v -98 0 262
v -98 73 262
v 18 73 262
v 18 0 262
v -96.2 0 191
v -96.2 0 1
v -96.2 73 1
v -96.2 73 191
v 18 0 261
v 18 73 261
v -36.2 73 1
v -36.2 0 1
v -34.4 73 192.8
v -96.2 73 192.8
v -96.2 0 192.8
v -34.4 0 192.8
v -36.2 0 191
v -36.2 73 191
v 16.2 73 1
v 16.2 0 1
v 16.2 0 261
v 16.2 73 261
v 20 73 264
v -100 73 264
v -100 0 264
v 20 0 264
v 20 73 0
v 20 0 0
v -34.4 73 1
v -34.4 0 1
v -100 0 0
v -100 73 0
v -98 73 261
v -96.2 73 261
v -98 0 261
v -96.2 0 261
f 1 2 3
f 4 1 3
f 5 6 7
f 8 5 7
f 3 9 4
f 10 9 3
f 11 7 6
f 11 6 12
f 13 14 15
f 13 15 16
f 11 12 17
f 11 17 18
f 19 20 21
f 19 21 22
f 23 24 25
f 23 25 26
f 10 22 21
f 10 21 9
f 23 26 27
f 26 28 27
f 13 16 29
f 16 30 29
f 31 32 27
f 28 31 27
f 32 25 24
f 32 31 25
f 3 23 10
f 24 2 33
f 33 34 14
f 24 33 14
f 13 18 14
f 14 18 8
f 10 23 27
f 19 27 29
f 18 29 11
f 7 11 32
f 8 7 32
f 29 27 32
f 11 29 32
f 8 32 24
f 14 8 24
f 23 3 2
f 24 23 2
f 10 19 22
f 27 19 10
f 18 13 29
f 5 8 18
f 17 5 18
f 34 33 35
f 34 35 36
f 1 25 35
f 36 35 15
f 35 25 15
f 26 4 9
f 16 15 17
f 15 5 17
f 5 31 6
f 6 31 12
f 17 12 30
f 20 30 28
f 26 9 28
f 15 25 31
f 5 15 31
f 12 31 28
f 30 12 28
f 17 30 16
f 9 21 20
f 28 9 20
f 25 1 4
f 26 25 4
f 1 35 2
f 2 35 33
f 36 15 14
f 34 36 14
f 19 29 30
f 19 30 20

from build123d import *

# Parameters (mm, degrees)
F0_W      = 120
F0_H      = 73
F1_DEPTH  = 1
F2_W      = 2
F2_H      = 73
F3_DEPTH  = 261
F4_W      = 120
F4_H      = 73
F5_DEPTH  = 2
F6_W      = 1.8
F6_H      = 73
F7_DEPTH  = 260
F9_W      = 1.8
F9_H      = 73
F10_DEPTH = 190
F11_W     = 60
F11_H     = 73
F11_W_2   = 1.8
F12_DEPTH = 1.8


with BuildPart() as f1:
    # F0 (on Top) → F1 (new body)
    with BuildSketch(Plane.XY):
        with Locations((-40, 36.5)):
            Rectangle(F0_W, F0_H)
    extrude(amount=F1_DEPTH)

    # F2 (on face) → F3 (join)
    with BuildSketch(Plane.XY.offset(1)):
        with Locations((-99, 36.5)):
            Rectangle(F2_W, F2_H)
        with Locations((19, 36.5)):
            Rectangle(F2_W, F2_H)
    extrude(amount=F3_DEPTH)

    # F4 (on face) → F5 (join)
    with BuildSketch(Plane.XY.offset(262)):
        with Locations((-40, 36.5)):
            Rectangle(F4_W, F4_H)
    extrude(amount=F5_DEPTH)

    # F6 (on face) → F7 (join)
    with BuildSketch(Plane.XY.offset(1)):
        with Locations((-97.1, 36.5)):
            Rectangle(F6_W, F6_H)
        with Locations((17.1, 36.5)):
            Rectangle(F6_W, F6_H)
    extrude(amount=F7_DEPTH)

    # F9 (on face) → F10 (join)
    with BuildSketch(Plane.XY.offset(1)):
        with Locations((-35.3, 36.5)):
            Rectangle(F9_W, F9_H)
    extrude(amount=F10_DEPTH)

    # F11 (on face) → F12 (join)
    with BuildSketch(Plane.XY.offset(191)):
        with Locations((-66.2, 36.5)):
            Rectangle(F11_W, F11_H)
        with Locations((-35.3, 36.5)):
            Rectangle(F11_W_2, F11_H)
    extrude(amount=F12_DEPTH)


solid = f1.part
